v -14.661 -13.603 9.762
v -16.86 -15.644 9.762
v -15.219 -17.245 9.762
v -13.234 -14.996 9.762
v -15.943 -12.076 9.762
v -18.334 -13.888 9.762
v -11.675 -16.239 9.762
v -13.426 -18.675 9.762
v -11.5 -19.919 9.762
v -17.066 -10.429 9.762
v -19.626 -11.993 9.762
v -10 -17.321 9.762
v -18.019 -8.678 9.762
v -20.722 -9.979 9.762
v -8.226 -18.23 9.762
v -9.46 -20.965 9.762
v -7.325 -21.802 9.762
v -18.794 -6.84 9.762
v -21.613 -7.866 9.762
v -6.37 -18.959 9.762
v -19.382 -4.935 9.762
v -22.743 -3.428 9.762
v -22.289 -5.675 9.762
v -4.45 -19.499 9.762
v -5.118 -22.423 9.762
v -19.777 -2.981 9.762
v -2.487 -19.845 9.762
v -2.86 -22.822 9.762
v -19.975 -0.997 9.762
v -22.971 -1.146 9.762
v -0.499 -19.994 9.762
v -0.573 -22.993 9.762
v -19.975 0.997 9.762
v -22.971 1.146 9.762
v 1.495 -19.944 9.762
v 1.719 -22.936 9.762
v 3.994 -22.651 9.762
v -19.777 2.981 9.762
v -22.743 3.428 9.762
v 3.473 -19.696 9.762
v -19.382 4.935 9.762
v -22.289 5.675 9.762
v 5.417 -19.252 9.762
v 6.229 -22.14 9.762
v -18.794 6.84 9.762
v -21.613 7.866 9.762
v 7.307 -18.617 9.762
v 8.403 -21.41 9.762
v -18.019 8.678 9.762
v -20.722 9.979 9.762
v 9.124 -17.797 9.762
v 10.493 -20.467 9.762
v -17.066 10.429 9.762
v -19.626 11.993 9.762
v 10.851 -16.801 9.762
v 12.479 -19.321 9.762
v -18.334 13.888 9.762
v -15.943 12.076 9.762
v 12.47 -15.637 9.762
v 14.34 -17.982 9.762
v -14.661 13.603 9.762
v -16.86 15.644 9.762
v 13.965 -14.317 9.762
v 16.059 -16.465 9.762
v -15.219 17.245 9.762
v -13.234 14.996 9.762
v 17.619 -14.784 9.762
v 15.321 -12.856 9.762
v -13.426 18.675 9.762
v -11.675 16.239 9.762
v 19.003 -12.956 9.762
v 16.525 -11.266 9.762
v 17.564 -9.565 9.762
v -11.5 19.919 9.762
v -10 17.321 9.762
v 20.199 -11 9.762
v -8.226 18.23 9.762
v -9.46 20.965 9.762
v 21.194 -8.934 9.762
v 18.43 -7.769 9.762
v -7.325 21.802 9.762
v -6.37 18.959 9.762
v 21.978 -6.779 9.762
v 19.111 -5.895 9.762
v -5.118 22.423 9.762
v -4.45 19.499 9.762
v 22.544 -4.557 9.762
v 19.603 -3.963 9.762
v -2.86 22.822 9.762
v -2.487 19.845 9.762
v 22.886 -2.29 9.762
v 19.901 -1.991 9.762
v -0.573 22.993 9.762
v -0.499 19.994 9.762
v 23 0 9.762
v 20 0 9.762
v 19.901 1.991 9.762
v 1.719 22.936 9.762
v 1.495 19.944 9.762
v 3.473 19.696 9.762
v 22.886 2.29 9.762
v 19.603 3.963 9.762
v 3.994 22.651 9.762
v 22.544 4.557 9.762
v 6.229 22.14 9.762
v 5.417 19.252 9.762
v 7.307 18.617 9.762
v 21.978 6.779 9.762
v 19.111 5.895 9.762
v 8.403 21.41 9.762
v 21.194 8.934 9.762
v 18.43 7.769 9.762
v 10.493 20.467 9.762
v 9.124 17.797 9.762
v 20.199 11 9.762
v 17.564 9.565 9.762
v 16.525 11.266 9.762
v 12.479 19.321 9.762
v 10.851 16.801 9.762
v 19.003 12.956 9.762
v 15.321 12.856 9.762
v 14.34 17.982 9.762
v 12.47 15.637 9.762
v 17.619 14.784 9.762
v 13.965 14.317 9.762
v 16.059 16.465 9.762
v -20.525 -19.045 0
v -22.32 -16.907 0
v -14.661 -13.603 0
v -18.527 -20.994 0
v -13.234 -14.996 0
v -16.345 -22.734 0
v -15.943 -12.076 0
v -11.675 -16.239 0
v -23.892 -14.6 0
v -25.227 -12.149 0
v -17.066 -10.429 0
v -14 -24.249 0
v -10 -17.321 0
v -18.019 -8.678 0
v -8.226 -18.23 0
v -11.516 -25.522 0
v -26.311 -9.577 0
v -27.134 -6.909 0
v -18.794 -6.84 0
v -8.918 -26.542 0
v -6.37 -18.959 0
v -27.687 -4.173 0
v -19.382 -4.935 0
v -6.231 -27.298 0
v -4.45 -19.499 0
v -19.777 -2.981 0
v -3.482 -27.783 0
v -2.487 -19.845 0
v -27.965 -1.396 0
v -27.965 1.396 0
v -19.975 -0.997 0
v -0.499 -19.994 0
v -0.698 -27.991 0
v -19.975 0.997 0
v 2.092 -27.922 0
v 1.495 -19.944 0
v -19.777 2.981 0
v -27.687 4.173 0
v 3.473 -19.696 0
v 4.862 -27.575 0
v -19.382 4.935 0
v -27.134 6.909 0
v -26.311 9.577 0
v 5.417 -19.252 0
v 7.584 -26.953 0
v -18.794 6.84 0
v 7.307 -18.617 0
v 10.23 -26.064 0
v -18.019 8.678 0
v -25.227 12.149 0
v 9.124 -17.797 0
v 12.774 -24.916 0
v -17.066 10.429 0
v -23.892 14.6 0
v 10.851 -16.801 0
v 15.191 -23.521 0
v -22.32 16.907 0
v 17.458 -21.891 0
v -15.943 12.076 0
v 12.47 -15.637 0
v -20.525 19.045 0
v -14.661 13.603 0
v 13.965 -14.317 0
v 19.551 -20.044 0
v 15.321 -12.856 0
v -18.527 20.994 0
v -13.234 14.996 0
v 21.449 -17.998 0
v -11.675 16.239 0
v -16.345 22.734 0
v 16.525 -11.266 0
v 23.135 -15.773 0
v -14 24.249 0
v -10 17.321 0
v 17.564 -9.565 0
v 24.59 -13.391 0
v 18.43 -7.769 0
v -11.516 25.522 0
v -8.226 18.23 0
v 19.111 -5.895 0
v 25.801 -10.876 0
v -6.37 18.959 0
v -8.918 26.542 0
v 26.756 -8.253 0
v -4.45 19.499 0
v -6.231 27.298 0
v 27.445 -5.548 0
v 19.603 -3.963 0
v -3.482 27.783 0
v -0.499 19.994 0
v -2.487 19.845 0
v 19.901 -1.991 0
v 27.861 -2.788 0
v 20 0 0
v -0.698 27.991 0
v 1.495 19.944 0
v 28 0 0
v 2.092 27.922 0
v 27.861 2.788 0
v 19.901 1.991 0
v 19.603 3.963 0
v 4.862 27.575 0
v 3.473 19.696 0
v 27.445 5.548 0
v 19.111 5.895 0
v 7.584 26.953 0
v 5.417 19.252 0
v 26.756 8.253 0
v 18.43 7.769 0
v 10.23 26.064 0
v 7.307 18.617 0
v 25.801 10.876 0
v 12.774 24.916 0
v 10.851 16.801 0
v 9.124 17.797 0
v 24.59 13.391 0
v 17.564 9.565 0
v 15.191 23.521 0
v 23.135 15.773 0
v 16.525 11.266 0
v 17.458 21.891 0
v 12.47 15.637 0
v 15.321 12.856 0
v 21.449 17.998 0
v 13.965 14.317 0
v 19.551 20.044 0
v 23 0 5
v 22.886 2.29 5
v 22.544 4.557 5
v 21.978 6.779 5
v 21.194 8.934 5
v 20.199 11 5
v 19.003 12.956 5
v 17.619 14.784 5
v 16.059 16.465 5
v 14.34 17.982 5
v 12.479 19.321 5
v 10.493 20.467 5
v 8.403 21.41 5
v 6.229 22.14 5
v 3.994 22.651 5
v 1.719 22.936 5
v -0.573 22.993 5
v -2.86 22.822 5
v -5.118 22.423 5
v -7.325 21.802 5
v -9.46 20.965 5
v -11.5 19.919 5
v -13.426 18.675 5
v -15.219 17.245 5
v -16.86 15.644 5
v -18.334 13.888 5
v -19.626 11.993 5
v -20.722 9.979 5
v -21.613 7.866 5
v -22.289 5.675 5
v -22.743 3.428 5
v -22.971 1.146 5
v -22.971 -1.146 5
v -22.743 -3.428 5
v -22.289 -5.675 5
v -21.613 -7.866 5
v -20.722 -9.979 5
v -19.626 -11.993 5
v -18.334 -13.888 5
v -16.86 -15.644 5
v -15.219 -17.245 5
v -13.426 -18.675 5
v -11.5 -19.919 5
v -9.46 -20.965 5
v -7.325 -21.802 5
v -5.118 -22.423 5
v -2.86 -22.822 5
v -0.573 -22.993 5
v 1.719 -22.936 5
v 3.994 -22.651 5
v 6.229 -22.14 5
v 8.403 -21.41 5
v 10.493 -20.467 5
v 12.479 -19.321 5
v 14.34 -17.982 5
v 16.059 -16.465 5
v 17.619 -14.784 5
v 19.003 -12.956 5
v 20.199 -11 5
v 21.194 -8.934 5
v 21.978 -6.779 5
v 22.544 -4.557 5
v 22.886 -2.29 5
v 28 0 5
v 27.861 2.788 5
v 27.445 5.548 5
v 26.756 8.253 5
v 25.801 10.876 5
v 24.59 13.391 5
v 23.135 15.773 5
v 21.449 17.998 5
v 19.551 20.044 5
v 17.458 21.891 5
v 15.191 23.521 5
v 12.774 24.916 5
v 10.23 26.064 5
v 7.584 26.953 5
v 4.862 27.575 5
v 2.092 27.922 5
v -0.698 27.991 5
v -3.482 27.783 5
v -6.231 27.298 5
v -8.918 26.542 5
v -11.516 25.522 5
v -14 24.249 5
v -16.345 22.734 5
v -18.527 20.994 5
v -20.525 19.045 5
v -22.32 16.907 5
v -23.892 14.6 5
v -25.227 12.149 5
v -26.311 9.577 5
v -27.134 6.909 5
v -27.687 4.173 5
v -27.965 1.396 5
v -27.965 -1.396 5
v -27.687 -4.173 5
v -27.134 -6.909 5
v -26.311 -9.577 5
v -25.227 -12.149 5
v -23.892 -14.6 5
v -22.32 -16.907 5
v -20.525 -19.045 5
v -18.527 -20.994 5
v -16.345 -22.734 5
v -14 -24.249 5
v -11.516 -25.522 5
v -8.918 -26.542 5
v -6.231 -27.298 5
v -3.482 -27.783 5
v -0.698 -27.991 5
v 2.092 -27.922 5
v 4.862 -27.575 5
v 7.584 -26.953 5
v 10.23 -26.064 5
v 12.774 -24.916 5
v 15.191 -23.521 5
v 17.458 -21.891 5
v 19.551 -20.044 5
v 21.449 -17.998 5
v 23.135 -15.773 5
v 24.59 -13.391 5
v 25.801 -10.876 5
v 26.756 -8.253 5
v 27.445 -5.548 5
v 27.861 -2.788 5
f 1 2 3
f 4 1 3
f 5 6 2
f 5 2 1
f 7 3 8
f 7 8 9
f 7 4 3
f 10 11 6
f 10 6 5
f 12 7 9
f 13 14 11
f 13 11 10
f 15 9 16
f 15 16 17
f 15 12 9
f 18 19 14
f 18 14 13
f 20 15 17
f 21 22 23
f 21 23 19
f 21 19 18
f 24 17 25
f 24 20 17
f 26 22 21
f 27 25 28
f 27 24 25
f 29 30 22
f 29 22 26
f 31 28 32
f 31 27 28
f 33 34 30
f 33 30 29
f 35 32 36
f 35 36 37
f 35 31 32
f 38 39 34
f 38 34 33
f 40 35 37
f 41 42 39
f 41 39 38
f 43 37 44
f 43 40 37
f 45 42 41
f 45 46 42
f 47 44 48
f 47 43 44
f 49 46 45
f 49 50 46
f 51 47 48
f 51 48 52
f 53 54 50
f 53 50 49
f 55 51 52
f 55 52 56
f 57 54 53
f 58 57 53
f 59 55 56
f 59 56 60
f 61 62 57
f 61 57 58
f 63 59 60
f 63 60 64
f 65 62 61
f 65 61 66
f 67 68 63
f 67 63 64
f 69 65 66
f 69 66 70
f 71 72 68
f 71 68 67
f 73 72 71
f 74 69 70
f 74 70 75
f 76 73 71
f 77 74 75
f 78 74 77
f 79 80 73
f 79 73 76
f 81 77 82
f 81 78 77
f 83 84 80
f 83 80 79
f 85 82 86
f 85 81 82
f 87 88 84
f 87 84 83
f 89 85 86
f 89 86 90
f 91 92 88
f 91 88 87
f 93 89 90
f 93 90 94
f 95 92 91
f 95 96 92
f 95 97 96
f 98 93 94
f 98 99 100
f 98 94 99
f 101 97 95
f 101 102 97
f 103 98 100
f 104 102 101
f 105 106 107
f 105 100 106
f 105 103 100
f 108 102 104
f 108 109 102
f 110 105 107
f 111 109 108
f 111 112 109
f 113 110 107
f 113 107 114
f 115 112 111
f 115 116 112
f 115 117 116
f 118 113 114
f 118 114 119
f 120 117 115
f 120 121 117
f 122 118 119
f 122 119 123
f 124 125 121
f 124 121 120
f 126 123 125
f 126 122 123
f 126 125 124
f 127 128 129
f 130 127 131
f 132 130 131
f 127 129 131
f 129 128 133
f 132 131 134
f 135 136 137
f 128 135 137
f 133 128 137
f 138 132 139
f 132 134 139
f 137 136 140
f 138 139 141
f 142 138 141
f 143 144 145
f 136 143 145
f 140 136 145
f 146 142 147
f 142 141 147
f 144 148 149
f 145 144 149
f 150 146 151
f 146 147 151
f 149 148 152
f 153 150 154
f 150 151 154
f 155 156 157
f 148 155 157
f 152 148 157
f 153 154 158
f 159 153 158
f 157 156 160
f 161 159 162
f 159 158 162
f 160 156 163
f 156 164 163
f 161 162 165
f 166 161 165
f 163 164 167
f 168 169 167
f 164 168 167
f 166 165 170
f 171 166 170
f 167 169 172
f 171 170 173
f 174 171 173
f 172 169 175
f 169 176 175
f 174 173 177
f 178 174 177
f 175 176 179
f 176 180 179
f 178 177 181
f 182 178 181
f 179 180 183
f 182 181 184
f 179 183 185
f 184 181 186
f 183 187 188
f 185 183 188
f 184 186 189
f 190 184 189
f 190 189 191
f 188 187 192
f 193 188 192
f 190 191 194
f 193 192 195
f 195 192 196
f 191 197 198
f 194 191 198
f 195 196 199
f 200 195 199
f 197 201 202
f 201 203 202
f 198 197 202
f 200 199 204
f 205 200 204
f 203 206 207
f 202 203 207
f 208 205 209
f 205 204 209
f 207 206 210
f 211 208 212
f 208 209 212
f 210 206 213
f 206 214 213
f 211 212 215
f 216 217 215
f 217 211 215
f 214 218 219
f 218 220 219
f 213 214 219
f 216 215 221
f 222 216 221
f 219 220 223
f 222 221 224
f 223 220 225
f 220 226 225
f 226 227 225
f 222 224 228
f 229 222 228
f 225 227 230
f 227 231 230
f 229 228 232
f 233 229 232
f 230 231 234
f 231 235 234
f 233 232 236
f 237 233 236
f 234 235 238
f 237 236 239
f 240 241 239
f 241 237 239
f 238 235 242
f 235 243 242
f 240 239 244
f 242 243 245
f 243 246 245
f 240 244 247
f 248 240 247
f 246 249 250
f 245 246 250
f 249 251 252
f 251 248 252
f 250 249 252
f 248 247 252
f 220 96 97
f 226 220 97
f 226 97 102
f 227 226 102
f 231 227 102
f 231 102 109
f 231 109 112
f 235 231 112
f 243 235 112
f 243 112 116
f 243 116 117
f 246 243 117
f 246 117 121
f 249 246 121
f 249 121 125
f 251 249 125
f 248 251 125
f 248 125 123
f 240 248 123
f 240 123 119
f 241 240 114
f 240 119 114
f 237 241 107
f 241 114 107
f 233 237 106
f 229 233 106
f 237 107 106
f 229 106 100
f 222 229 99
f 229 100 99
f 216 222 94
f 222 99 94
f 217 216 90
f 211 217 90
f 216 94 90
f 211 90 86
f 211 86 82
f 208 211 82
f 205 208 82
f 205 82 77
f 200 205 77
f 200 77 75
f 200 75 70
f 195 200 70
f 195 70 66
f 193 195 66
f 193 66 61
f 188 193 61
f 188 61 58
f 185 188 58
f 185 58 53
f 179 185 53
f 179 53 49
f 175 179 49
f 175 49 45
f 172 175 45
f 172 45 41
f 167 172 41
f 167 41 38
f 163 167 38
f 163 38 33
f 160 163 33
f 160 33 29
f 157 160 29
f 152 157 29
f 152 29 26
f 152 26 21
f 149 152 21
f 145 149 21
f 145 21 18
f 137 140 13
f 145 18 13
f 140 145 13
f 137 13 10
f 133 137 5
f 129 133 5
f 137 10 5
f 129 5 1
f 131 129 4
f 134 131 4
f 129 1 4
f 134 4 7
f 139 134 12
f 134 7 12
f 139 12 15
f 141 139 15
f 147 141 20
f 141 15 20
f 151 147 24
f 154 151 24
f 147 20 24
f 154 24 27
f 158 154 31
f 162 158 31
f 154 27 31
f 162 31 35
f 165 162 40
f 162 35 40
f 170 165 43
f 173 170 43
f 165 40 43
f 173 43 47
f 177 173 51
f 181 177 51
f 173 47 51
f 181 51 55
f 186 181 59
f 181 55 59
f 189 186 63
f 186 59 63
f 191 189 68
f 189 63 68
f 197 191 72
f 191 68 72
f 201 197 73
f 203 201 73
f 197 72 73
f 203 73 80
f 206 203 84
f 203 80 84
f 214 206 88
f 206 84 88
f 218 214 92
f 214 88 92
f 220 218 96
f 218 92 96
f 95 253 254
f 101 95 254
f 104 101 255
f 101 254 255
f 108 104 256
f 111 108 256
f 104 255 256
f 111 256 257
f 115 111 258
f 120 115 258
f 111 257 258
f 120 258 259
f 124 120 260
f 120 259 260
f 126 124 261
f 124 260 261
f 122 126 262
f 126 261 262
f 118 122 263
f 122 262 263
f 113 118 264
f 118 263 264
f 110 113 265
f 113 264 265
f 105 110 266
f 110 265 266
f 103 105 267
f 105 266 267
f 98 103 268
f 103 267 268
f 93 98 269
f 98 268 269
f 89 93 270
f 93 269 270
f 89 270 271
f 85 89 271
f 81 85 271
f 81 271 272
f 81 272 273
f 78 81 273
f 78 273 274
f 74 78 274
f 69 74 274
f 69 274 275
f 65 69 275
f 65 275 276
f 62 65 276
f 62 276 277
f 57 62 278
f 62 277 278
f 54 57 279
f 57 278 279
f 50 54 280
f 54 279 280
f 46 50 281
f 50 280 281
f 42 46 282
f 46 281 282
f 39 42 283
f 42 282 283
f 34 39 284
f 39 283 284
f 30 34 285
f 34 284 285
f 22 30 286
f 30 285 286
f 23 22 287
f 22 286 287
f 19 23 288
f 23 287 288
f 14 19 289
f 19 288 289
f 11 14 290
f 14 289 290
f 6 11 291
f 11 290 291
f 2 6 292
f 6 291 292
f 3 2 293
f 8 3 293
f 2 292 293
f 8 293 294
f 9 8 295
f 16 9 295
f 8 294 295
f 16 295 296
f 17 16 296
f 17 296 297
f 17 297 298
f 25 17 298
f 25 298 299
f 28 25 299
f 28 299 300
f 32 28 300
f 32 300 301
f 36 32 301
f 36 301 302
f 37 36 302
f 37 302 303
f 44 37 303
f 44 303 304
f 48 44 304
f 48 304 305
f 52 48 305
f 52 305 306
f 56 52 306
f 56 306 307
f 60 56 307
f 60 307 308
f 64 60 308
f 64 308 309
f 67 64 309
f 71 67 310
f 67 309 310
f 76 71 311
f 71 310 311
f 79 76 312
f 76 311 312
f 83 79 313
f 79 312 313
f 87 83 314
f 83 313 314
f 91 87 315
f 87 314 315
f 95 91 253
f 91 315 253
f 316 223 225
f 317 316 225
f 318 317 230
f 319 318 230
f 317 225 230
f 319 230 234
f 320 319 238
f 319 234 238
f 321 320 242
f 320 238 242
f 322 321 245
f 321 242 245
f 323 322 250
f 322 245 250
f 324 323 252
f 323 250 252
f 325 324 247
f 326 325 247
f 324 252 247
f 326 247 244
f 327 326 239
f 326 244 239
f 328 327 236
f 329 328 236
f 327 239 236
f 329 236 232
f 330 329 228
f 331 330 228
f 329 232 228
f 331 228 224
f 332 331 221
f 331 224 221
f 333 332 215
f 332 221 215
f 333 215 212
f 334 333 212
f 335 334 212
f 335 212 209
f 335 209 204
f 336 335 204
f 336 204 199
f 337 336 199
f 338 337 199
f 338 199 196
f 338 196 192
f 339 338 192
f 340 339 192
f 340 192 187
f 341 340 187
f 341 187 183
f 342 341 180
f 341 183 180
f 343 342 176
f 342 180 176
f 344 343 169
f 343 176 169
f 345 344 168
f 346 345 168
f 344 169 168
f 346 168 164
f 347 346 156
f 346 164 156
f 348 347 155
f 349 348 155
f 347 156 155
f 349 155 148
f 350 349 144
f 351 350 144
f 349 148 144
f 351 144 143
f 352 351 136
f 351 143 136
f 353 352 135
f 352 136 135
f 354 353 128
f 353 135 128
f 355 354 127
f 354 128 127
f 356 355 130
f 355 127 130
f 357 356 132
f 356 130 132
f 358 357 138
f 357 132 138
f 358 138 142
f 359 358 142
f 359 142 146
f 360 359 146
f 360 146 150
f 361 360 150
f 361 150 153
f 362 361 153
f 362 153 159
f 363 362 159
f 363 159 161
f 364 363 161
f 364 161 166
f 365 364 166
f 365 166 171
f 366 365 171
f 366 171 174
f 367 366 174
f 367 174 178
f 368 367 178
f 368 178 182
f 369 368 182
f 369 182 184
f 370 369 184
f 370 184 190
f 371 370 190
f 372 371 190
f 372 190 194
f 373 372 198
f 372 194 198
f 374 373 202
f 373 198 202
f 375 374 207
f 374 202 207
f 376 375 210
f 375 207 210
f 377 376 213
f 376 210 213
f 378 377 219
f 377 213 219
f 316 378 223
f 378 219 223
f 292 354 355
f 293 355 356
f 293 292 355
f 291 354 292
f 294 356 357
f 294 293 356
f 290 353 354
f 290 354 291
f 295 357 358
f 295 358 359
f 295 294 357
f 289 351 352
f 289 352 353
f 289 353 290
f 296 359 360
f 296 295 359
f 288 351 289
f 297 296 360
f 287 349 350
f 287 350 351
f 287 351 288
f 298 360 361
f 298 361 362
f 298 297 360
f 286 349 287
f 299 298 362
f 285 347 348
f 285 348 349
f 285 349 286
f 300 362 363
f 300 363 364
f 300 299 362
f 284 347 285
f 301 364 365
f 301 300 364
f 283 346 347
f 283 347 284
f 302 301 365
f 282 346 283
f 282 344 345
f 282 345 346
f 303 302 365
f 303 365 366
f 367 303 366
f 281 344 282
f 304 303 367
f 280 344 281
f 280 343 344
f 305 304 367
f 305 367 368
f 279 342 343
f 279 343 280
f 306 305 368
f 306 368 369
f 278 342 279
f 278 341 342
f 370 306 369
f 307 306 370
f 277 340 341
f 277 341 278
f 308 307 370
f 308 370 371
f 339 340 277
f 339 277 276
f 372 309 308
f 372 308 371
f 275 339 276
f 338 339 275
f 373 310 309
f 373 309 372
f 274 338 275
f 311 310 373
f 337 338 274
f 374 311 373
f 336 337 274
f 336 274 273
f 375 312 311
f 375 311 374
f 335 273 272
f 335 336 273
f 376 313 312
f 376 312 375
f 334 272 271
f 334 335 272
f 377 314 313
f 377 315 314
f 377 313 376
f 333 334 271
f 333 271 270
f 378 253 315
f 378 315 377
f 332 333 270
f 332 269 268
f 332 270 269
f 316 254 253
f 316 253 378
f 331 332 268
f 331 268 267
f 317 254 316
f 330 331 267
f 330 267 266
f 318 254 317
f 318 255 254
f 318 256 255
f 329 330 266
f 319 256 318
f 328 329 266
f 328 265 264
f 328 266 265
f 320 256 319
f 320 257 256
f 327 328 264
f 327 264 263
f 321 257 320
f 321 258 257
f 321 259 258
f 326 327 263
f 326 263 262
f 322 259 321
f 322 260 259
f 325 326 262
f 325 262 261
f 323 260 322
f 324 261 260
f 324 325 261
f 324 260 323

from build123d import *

# Parameters (mm, degrees)
SKETCH1_R               = 28
BOSS_EXTRUDE1_DEPTH     = 5
SKETCH2_R               = 23
BOSS_EXTRUDE2_DEPTH     = 4.7625
SKETCH3_R               = 20
CUT_EXTRUDE1_DEPTH      = 1
CUT_EXTRUDE1_DEPTH_BACK = 10.7625


with BuildPart() as part:
    # Sketch1 → Boss-Extrude1 (new body)
    with BuildSketch(Plane.XY):
        Circle(SKETCH1_R)
    extrude(amount=BOSS_EXTRUDE1_DEPTH)

    # Sketch2 → Boss-Extrude2 (add)
    with BuildSketch(Plane.XY.offset(5)):
        Circle(SKETCH2_R)
    extrude(amount=BOSS_EXTRUDE2_DEPTH)

    # Sketch3 → Cut-Extrude1 (cut, two sides)
    with BuildSketch(Plane.XY.offset(9.7625)) as cut_extrude1_sk:
        Circle(SKETCH3_R)
    extrude(amount=CUT_EXTRUDE1_DEPTH, mode=Mode.SUBTRACT)
    extrude(cut_extrude1_sk.sketch, amount=-CUT_EXTRUDE1_DEPTH_BACK, mode=Mode.SUBTRACT)


solid = part.part
